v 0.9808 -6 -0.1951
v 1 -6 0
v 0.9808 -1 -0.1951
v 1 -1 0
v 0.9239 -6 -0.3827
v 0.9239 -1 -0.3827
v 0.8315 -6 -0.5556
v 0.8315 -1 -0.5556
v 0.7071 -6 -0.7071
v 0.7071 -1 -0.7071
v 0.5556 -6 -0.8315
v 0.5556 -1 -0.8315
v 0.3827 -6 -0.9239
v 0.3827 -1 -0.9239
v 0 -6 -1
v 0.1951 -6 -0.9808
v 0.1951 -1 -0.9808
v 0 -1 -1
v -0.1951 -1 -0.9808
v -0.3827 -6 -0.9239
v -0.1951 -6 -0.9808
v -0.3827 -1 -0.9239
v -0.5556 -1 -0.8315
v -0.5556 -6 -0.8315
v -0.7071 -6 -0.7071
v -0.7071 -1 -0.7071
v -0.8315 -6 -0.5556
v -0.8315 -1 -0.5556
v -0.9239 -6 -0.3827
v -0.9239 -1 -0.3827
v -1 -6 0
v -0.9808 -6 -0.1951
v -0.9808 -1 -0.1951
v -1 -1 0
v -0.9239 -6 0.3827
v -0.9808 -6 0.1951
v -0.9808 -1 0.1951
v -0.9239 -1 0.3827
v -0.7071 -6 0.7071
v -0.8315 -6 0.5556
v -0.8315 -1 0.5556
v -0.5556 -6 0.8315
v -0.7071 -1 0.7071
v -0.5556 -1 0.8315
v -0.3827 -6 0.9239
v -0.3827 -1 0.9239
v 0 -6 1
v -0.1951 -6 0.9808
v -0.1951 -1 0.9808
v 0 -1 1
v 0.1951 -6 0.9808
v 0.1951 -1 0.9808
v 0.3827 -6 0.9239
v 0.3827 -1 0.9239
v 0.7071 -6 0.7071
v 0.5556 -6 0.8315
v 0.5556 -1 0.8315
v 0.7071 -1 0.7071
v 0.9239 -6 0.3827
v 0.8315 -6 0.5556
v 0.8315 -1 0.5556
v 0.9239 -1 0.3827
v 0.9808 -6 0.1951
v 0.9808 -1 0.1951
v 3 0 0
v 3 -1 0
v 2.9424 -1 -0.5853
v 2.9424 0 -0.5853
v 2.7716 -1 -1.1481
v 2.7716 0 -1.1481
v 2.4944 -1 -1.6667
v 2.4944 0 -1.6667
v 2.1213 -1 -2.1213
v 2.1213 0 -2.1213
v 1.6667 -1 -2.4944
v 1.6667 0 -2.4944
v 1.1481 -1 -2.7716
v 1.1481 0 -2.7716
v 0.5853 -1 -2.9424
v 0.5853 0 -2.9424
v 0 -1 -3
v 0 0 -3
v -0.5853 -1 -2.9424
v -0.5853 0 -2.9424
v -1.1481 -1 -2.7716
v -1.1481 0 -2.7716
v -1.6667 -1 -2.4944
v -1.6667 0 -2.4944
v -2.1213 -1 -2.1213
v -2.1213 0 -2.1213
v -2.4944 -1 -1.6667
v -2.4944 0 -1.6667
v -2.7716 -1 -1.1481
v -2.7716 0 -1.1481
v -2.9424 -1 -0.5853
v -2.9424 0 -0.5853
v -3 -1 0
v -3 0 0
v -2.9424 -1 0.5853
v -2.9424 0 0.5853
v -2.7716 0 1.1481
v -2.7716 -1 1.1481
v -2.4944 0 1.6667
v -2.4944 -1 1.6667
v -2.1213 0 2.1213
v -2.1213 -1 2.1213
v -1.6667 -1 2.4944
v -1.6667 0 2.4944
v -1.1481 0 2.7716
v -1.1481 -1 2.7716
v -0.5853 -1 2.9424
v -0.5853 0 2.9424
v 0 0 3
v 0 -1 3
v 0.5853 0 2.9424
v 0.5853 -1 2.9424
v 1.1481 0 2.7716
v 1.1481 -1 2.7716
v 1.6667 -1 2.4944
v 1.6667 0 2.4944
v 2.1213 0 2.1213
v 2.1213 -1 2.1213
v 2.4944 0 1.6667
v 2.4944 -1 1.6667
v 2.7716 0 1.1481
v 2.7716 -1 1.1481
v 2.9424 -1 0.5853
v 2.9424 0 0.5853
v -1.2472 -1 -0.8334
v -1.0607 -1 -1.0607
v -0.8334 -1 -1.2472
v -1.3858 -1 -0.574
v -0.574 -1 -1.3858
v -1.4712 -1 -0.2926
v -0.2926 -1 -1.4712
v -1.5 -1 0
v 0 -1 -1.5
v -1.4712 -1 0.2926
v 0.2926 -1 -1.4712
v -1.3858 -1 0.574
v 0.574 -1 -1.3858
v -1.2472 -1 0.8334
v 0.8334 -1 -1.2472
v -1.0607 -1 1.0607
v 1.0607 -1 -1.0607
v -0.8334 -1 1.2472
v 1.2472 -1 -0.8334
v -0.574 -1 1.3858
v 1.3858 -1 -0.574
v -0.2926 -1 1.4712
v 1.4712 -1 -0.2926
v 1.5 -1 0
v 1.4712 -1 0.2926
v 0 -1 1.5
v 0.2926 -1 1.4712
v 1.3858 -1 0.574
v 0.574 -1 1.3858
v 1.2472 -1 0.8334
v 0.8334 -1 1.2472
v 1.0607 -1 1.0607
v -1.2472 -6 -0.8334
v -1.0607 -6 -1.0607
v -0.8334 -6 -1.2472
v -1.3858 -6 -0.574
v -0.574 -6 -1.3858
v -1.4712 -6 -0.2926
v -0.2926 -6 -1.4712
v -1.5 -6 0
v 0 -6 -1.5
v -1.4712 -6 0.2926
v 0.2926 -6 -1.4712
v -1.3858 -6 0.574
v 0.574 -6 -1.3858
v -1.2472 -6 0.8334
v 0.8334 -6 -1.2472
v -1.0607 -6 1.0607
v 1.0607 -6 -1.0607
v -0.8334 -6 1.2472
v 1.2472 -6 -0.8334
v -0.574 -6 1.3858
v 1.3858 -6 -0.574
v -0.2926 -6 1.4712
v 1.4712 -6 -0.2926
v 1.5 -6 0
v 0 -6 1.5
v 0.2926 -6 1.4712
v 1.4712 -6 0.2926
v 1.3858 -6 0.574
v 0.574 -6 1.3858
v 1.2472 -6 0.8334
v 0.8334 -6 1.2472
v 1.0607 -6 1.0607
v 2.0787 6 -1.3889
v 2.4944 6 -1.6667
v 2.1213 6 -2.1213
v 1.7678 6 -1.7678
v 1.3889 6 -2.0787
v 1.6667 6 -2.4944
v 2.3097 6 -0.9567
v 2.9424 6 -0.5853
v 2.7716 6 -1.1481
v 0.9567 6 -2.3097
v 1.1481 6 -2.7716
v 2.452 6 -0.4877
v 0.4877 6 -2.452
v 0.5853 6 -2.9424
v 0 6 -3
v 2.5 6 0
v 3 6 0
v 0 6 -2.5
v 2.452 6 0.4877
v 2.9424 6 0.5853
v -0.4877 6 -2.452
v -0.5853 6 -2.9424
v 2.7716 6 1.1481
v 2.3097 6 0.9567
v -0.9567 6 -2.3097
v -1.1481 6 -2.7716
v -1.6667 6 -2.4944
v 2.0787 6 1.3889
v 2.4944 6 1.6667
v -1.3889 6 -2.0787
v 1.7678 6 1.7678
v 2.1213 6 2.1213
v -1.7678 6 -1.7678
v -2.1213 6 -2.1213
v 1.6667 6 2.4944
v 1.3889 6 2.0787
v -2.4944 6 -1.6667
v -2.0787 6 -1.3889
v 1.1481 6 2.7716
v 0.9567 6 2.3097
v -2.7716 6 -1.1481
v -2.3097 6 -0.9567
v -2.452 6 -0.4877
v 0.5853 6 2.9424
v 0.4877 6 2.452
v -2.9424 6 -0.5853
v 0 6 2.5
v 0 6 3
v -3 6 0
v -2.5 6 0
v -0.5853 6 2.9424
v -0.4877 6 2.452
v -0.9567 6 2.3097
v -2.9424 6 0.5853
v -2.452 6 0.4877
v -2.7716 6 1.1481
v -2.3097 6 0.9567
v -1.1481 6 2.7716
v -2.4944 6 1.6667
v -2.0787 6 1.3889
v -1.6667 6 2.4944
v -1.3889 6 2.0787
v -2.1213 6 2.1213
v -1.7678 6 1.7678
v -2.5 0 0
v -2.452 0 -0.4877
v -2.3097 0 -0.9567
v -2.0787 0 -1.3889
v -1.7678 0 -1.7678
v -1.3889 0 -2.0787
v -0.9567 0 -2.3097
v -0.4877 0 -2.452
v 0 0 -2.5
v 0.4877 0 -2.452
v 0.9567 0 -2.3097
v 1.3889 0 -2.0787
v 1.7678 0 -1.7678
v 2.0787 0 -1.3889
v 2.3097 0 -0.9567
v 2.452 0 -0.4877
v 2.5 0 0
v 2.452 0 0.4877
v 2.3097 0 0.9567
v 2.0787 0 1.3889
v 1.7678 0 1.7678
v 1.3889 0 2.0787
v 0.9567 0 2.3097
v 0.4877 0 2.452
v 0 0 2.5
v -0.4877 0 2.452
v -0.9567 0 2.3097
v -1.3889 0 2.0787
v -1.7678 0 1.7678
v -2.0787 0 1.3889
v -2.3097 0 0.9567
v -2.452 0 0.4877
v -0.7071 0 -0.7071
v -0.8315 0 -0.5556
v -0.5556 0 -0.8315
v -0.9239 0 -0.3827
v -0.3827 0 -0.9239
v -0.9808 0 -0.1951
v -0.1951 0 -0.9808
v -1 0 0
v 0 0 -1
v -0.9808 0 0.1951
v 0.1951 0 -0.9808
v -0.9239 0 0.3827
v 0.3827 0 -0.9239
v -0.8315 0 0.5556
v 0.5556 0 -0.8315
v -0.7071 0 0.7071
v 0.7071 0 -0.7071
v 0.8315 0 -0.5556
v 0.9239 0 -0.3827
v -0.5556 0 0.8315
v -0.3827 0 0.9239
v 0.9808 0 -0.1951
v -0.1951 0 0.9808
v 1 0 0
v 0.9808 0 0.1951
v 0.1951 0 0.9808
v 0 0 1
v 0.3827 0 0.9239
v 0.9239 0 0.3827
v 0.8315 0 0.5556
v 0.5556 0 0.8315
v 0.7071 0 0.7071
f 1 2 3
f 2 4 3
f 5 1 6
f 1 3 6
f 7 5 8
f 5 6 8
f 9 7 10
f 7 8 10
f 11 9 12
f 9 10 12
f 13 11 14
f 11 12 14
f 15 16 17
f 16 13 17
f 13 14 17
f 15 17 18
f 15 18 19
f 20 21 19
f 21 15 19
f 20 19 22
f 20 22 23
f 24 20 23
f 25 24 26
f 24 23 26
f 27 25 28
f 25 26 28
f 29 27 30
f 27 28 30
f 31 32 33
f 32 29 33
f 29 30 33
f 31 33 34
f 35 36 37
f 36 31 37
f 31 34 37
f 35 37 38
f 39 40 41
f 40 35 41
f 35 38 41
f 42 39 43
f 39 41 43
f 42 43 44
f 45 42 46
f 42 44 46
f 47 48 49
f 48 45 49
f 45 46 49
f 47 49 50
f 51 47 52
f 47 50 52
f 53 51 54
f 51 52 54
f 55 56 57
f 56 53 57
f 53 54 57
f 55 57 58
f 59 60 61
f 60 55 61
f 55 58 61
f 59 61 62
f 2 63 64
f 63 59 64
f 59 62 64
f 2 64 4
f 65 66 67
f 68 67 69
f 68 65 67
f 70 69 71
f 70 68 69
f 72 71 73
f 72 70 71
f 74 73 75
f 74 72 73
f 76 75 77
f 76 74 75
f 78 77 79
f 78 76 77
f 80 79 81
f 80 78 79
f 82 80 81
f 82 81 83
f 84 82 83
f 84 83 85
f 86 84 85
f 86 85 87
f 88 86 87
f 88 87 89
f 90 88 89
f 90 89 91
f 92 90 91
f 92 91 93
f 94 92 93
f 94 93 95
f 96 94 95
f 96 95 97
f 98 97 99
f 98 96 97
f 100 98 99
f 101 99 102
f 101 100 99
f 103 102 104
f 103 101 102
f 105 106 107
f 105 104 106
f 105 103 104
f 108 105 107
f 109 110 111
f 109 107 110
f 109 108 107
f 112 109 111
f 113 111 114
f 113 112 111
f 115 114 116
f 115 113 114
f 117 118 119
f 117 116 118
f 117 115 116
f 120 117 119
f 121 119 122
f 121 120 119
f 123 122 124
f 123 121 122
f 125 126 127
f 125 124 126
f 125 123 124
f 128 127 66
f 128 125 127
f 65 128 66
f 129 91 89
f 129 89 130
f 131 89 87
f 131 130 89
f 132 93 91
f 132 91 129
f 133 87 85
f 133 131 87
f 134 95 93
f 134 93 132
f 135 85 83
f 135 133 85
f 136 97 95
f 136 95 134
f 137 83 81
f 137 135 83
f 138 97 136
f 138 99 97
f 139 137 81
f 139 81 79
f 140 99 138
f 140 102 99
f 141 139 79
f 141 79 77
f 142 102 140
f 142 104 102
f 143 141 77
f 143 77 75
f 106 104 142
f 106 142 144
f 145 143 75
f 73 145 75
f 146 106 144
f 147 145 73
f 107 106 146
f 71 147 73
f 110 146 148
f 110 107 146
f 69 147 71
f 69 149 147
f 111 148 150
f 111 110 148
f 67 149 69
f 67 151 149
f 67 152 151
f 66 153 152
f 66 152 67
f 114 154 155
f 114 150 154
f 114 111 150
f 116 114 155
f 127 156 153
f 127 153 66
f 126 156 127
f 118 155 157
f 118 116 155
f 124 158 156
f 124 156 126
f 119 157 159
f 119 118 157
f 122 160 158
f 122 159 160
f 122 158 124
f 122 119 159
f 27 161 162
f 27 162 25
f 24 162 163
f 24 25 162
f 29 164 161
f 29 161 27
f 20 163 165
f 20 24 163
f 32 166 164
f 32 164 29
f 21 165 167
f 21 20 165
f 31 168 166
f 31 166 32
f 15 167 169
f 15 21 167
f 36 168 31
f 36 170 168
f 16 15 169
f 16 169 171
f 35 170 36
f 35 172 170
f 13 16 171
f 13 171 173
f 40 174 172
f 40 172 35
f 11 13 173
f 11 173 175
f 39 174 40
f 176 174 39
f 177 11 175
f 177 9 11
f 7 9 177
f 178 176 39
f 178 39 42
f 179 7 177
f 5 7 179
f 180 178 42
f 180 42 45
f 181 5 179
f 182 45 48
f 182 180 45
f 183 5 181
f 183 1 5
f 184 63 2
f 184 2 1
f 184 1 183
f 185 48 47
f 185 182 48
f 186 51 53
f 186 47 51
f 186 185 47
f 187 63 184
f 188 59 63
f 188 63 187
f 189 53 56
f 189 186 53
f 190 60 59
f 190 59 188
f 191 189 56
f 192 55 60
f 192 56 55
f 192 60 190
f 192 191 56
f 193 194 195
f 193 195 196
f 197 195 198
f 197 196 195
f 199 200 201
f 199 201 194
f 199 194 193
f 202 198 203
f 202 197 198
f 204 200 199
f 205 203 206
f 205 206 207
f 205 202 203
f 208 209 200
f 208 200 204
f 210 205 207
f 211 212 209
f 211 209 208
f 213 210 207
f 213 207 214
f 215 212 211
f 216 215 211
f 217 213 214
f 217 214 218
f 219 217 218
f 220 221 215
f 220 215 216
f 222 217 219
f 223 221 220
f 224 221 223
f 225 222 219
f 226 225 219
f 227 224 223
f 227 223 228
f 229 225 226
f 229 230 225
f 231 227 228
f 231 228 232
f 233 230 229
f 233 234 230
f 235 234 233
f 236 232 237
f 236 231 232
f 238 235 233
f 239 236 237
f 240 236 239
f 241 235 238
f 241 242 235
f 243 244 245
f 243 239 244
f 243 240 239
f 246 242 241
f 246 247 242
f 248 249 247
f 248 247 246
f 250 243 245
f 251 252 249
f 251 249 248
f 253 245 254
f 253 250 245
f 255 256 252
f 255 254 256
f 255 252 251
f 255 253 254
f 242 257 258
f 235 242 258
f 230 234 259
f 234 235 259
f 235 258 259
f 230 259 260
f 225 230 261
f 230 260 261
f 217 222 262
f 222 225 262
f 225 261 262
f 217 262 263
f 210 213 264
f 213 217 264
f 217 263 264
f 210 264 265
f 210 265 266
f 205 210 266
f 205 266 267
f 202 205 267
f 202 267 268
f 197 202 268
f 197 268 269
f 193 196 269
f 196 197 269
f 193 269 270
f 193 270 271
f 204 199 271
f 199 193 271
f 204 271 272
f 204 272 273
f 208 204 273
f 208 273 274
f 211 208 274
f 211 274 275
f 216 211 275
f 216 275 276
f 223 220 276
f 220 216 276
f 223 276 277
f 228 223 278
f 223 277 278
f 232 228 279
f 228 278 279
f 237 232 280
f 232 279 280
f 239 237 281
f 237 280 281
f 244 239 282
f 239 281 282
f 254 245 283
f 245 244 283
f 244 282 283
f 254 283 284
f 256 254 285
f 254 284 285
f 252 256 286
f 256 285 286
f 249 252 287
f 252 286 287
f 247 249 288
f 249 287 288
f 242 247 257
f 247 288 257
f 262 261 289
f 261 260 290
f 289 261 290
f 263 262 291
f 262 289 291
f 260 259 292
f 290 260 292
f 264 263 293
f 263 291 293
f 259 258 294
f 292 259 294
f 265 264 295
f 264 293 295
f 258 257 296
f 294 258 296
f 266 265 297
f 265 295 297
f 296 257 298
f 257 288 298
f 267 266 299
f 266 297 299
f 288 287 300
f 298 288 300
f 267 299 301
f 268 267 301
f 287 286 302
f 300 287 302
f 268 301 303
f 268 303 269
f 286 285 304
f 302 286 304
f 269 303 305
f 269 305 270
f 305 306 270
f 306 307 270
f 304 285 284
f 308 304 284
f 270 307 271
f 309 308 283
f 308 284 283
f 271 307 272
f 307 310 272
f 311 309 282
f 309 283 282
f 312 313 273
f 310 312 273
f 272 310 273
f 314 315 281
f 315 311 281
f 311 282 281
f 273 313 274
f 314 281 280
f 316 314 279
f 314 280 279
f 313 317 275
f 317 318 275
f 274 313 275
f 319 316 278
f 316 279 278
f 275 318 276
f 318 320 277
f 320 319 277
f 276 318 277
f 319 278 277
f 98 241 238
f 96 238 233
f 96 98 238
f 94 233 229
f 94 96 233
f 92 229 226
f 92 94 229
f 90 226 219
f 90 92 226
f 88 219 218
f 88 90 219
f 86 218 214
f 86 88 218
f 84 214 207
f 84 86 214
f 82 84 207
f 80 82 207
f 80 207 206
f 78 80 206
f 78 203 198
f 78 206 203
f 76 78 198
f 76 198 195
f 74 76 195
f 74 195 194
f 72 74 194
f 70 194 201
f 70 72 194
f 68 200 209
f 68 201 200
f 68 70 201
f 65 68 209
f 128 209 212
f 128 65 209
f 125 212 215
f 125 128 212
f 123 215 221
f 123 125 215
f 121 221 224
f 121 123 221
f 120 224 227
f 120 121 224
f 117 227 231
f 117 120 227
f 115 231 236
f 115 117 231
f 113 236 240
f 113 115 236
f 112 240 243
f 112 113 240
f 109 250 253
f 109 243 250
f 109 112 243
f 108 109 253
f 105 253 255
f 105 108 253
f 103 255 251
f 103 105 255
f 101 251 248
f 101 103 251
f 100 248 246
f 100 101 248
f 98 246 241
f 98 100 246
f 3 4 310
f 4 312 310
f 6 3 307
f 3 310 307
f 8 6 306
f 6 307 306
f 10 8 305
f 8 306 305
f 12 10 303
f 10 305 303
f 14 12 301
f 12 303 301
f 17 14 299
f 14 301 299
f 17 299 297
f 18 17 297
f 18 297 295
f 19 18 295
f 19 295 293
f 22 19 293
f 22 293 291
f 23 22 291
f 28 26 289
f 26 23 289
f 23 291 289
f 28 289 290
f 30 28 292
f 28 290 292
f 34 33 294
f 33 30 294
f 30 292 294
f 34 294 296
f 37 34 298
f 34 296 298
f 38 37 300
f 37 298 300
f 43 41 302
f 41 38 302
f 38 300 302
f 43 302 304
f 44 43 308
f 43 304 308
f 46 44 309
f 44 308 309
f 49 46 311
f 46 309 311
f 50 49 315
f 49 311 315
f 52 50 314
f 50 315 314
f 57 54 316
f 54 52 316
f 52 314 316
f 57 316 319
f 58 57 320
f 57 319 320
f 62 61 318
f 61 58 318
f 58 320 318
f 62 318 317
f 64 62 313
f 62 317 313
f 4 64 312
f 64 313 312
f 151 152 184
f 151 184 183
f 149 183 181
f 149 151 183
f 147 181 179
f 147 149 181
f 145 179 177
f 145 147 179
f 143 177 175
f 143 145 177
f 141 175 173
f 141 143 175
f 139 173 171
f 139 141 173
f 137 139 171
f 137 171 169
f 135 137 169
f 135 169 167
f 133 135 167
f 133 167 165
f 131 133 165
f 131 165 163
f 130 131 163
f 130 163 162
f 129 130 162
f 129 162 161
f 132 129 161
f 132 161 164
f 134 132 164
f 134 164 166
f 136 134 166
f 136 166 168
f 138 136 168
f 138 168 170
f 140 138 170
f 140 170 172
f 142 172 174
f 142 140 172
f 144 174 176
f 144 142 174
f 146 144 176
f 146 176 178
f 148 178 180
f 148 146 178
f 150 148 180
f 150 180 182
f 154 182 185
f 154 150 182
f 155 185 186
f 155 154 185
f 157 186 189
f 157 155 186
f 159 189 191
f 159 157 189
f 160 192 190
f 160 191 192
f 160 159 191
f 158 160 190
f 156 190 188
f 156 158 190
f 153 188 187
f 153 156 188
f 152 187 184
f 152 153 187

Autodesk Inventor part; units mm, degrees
ref_plane "YZ Plane" through (0, 0, 0) normal (1, 0, 0) x (0, 1, 0)
ref_plane "XZ Plane" through (0, 0, 0) normal (0, 1, 0) x (-1, 0, 0)
ref_plane "XY Plane" through (0, 0, 0) normal (0, 0, 1) x (1, 0, 0)
sketch "Sketch1" plane through (0, 0, 0) normal (0, 1, 0) x (-1, 0, 0)
  circle A0 centre (0, 0) radius 3
  circle A1 centre (0, 0) radius 2.5
  dimension "d0" = 6
  dimension "d1" = 5
extrude "Extrusion1" add sketch "Sketch1" along normal blind 6
sketch "Sketch2" plane through (0, 0, 0) normal (0, -1, 0) x (1, 0, 0)
  circle A0 centre (0, 0) radius 1
  circle A1 centre (0, 0) radius 3
  dimension "d6" = 2
extrude "Extrusion2" add sketch "Sketch2" along normal blind 1
sketch "Sketch3" plane through (0, -1, 0) normal (0, -1, 0) x (1, 0, 0)
  circle A0 centre (0, 0) radius 1.5
  circle A1 centre (0, 0) radius 1
  dimension "d9" = 3
extrude "Extrusion3" add sketch "Sketch3" along normal blind 5
thread "Thread2" size "M3x0.5" class "6g" standard "ISO Metric profile" full length
properties part number "NozzleAttachment"
